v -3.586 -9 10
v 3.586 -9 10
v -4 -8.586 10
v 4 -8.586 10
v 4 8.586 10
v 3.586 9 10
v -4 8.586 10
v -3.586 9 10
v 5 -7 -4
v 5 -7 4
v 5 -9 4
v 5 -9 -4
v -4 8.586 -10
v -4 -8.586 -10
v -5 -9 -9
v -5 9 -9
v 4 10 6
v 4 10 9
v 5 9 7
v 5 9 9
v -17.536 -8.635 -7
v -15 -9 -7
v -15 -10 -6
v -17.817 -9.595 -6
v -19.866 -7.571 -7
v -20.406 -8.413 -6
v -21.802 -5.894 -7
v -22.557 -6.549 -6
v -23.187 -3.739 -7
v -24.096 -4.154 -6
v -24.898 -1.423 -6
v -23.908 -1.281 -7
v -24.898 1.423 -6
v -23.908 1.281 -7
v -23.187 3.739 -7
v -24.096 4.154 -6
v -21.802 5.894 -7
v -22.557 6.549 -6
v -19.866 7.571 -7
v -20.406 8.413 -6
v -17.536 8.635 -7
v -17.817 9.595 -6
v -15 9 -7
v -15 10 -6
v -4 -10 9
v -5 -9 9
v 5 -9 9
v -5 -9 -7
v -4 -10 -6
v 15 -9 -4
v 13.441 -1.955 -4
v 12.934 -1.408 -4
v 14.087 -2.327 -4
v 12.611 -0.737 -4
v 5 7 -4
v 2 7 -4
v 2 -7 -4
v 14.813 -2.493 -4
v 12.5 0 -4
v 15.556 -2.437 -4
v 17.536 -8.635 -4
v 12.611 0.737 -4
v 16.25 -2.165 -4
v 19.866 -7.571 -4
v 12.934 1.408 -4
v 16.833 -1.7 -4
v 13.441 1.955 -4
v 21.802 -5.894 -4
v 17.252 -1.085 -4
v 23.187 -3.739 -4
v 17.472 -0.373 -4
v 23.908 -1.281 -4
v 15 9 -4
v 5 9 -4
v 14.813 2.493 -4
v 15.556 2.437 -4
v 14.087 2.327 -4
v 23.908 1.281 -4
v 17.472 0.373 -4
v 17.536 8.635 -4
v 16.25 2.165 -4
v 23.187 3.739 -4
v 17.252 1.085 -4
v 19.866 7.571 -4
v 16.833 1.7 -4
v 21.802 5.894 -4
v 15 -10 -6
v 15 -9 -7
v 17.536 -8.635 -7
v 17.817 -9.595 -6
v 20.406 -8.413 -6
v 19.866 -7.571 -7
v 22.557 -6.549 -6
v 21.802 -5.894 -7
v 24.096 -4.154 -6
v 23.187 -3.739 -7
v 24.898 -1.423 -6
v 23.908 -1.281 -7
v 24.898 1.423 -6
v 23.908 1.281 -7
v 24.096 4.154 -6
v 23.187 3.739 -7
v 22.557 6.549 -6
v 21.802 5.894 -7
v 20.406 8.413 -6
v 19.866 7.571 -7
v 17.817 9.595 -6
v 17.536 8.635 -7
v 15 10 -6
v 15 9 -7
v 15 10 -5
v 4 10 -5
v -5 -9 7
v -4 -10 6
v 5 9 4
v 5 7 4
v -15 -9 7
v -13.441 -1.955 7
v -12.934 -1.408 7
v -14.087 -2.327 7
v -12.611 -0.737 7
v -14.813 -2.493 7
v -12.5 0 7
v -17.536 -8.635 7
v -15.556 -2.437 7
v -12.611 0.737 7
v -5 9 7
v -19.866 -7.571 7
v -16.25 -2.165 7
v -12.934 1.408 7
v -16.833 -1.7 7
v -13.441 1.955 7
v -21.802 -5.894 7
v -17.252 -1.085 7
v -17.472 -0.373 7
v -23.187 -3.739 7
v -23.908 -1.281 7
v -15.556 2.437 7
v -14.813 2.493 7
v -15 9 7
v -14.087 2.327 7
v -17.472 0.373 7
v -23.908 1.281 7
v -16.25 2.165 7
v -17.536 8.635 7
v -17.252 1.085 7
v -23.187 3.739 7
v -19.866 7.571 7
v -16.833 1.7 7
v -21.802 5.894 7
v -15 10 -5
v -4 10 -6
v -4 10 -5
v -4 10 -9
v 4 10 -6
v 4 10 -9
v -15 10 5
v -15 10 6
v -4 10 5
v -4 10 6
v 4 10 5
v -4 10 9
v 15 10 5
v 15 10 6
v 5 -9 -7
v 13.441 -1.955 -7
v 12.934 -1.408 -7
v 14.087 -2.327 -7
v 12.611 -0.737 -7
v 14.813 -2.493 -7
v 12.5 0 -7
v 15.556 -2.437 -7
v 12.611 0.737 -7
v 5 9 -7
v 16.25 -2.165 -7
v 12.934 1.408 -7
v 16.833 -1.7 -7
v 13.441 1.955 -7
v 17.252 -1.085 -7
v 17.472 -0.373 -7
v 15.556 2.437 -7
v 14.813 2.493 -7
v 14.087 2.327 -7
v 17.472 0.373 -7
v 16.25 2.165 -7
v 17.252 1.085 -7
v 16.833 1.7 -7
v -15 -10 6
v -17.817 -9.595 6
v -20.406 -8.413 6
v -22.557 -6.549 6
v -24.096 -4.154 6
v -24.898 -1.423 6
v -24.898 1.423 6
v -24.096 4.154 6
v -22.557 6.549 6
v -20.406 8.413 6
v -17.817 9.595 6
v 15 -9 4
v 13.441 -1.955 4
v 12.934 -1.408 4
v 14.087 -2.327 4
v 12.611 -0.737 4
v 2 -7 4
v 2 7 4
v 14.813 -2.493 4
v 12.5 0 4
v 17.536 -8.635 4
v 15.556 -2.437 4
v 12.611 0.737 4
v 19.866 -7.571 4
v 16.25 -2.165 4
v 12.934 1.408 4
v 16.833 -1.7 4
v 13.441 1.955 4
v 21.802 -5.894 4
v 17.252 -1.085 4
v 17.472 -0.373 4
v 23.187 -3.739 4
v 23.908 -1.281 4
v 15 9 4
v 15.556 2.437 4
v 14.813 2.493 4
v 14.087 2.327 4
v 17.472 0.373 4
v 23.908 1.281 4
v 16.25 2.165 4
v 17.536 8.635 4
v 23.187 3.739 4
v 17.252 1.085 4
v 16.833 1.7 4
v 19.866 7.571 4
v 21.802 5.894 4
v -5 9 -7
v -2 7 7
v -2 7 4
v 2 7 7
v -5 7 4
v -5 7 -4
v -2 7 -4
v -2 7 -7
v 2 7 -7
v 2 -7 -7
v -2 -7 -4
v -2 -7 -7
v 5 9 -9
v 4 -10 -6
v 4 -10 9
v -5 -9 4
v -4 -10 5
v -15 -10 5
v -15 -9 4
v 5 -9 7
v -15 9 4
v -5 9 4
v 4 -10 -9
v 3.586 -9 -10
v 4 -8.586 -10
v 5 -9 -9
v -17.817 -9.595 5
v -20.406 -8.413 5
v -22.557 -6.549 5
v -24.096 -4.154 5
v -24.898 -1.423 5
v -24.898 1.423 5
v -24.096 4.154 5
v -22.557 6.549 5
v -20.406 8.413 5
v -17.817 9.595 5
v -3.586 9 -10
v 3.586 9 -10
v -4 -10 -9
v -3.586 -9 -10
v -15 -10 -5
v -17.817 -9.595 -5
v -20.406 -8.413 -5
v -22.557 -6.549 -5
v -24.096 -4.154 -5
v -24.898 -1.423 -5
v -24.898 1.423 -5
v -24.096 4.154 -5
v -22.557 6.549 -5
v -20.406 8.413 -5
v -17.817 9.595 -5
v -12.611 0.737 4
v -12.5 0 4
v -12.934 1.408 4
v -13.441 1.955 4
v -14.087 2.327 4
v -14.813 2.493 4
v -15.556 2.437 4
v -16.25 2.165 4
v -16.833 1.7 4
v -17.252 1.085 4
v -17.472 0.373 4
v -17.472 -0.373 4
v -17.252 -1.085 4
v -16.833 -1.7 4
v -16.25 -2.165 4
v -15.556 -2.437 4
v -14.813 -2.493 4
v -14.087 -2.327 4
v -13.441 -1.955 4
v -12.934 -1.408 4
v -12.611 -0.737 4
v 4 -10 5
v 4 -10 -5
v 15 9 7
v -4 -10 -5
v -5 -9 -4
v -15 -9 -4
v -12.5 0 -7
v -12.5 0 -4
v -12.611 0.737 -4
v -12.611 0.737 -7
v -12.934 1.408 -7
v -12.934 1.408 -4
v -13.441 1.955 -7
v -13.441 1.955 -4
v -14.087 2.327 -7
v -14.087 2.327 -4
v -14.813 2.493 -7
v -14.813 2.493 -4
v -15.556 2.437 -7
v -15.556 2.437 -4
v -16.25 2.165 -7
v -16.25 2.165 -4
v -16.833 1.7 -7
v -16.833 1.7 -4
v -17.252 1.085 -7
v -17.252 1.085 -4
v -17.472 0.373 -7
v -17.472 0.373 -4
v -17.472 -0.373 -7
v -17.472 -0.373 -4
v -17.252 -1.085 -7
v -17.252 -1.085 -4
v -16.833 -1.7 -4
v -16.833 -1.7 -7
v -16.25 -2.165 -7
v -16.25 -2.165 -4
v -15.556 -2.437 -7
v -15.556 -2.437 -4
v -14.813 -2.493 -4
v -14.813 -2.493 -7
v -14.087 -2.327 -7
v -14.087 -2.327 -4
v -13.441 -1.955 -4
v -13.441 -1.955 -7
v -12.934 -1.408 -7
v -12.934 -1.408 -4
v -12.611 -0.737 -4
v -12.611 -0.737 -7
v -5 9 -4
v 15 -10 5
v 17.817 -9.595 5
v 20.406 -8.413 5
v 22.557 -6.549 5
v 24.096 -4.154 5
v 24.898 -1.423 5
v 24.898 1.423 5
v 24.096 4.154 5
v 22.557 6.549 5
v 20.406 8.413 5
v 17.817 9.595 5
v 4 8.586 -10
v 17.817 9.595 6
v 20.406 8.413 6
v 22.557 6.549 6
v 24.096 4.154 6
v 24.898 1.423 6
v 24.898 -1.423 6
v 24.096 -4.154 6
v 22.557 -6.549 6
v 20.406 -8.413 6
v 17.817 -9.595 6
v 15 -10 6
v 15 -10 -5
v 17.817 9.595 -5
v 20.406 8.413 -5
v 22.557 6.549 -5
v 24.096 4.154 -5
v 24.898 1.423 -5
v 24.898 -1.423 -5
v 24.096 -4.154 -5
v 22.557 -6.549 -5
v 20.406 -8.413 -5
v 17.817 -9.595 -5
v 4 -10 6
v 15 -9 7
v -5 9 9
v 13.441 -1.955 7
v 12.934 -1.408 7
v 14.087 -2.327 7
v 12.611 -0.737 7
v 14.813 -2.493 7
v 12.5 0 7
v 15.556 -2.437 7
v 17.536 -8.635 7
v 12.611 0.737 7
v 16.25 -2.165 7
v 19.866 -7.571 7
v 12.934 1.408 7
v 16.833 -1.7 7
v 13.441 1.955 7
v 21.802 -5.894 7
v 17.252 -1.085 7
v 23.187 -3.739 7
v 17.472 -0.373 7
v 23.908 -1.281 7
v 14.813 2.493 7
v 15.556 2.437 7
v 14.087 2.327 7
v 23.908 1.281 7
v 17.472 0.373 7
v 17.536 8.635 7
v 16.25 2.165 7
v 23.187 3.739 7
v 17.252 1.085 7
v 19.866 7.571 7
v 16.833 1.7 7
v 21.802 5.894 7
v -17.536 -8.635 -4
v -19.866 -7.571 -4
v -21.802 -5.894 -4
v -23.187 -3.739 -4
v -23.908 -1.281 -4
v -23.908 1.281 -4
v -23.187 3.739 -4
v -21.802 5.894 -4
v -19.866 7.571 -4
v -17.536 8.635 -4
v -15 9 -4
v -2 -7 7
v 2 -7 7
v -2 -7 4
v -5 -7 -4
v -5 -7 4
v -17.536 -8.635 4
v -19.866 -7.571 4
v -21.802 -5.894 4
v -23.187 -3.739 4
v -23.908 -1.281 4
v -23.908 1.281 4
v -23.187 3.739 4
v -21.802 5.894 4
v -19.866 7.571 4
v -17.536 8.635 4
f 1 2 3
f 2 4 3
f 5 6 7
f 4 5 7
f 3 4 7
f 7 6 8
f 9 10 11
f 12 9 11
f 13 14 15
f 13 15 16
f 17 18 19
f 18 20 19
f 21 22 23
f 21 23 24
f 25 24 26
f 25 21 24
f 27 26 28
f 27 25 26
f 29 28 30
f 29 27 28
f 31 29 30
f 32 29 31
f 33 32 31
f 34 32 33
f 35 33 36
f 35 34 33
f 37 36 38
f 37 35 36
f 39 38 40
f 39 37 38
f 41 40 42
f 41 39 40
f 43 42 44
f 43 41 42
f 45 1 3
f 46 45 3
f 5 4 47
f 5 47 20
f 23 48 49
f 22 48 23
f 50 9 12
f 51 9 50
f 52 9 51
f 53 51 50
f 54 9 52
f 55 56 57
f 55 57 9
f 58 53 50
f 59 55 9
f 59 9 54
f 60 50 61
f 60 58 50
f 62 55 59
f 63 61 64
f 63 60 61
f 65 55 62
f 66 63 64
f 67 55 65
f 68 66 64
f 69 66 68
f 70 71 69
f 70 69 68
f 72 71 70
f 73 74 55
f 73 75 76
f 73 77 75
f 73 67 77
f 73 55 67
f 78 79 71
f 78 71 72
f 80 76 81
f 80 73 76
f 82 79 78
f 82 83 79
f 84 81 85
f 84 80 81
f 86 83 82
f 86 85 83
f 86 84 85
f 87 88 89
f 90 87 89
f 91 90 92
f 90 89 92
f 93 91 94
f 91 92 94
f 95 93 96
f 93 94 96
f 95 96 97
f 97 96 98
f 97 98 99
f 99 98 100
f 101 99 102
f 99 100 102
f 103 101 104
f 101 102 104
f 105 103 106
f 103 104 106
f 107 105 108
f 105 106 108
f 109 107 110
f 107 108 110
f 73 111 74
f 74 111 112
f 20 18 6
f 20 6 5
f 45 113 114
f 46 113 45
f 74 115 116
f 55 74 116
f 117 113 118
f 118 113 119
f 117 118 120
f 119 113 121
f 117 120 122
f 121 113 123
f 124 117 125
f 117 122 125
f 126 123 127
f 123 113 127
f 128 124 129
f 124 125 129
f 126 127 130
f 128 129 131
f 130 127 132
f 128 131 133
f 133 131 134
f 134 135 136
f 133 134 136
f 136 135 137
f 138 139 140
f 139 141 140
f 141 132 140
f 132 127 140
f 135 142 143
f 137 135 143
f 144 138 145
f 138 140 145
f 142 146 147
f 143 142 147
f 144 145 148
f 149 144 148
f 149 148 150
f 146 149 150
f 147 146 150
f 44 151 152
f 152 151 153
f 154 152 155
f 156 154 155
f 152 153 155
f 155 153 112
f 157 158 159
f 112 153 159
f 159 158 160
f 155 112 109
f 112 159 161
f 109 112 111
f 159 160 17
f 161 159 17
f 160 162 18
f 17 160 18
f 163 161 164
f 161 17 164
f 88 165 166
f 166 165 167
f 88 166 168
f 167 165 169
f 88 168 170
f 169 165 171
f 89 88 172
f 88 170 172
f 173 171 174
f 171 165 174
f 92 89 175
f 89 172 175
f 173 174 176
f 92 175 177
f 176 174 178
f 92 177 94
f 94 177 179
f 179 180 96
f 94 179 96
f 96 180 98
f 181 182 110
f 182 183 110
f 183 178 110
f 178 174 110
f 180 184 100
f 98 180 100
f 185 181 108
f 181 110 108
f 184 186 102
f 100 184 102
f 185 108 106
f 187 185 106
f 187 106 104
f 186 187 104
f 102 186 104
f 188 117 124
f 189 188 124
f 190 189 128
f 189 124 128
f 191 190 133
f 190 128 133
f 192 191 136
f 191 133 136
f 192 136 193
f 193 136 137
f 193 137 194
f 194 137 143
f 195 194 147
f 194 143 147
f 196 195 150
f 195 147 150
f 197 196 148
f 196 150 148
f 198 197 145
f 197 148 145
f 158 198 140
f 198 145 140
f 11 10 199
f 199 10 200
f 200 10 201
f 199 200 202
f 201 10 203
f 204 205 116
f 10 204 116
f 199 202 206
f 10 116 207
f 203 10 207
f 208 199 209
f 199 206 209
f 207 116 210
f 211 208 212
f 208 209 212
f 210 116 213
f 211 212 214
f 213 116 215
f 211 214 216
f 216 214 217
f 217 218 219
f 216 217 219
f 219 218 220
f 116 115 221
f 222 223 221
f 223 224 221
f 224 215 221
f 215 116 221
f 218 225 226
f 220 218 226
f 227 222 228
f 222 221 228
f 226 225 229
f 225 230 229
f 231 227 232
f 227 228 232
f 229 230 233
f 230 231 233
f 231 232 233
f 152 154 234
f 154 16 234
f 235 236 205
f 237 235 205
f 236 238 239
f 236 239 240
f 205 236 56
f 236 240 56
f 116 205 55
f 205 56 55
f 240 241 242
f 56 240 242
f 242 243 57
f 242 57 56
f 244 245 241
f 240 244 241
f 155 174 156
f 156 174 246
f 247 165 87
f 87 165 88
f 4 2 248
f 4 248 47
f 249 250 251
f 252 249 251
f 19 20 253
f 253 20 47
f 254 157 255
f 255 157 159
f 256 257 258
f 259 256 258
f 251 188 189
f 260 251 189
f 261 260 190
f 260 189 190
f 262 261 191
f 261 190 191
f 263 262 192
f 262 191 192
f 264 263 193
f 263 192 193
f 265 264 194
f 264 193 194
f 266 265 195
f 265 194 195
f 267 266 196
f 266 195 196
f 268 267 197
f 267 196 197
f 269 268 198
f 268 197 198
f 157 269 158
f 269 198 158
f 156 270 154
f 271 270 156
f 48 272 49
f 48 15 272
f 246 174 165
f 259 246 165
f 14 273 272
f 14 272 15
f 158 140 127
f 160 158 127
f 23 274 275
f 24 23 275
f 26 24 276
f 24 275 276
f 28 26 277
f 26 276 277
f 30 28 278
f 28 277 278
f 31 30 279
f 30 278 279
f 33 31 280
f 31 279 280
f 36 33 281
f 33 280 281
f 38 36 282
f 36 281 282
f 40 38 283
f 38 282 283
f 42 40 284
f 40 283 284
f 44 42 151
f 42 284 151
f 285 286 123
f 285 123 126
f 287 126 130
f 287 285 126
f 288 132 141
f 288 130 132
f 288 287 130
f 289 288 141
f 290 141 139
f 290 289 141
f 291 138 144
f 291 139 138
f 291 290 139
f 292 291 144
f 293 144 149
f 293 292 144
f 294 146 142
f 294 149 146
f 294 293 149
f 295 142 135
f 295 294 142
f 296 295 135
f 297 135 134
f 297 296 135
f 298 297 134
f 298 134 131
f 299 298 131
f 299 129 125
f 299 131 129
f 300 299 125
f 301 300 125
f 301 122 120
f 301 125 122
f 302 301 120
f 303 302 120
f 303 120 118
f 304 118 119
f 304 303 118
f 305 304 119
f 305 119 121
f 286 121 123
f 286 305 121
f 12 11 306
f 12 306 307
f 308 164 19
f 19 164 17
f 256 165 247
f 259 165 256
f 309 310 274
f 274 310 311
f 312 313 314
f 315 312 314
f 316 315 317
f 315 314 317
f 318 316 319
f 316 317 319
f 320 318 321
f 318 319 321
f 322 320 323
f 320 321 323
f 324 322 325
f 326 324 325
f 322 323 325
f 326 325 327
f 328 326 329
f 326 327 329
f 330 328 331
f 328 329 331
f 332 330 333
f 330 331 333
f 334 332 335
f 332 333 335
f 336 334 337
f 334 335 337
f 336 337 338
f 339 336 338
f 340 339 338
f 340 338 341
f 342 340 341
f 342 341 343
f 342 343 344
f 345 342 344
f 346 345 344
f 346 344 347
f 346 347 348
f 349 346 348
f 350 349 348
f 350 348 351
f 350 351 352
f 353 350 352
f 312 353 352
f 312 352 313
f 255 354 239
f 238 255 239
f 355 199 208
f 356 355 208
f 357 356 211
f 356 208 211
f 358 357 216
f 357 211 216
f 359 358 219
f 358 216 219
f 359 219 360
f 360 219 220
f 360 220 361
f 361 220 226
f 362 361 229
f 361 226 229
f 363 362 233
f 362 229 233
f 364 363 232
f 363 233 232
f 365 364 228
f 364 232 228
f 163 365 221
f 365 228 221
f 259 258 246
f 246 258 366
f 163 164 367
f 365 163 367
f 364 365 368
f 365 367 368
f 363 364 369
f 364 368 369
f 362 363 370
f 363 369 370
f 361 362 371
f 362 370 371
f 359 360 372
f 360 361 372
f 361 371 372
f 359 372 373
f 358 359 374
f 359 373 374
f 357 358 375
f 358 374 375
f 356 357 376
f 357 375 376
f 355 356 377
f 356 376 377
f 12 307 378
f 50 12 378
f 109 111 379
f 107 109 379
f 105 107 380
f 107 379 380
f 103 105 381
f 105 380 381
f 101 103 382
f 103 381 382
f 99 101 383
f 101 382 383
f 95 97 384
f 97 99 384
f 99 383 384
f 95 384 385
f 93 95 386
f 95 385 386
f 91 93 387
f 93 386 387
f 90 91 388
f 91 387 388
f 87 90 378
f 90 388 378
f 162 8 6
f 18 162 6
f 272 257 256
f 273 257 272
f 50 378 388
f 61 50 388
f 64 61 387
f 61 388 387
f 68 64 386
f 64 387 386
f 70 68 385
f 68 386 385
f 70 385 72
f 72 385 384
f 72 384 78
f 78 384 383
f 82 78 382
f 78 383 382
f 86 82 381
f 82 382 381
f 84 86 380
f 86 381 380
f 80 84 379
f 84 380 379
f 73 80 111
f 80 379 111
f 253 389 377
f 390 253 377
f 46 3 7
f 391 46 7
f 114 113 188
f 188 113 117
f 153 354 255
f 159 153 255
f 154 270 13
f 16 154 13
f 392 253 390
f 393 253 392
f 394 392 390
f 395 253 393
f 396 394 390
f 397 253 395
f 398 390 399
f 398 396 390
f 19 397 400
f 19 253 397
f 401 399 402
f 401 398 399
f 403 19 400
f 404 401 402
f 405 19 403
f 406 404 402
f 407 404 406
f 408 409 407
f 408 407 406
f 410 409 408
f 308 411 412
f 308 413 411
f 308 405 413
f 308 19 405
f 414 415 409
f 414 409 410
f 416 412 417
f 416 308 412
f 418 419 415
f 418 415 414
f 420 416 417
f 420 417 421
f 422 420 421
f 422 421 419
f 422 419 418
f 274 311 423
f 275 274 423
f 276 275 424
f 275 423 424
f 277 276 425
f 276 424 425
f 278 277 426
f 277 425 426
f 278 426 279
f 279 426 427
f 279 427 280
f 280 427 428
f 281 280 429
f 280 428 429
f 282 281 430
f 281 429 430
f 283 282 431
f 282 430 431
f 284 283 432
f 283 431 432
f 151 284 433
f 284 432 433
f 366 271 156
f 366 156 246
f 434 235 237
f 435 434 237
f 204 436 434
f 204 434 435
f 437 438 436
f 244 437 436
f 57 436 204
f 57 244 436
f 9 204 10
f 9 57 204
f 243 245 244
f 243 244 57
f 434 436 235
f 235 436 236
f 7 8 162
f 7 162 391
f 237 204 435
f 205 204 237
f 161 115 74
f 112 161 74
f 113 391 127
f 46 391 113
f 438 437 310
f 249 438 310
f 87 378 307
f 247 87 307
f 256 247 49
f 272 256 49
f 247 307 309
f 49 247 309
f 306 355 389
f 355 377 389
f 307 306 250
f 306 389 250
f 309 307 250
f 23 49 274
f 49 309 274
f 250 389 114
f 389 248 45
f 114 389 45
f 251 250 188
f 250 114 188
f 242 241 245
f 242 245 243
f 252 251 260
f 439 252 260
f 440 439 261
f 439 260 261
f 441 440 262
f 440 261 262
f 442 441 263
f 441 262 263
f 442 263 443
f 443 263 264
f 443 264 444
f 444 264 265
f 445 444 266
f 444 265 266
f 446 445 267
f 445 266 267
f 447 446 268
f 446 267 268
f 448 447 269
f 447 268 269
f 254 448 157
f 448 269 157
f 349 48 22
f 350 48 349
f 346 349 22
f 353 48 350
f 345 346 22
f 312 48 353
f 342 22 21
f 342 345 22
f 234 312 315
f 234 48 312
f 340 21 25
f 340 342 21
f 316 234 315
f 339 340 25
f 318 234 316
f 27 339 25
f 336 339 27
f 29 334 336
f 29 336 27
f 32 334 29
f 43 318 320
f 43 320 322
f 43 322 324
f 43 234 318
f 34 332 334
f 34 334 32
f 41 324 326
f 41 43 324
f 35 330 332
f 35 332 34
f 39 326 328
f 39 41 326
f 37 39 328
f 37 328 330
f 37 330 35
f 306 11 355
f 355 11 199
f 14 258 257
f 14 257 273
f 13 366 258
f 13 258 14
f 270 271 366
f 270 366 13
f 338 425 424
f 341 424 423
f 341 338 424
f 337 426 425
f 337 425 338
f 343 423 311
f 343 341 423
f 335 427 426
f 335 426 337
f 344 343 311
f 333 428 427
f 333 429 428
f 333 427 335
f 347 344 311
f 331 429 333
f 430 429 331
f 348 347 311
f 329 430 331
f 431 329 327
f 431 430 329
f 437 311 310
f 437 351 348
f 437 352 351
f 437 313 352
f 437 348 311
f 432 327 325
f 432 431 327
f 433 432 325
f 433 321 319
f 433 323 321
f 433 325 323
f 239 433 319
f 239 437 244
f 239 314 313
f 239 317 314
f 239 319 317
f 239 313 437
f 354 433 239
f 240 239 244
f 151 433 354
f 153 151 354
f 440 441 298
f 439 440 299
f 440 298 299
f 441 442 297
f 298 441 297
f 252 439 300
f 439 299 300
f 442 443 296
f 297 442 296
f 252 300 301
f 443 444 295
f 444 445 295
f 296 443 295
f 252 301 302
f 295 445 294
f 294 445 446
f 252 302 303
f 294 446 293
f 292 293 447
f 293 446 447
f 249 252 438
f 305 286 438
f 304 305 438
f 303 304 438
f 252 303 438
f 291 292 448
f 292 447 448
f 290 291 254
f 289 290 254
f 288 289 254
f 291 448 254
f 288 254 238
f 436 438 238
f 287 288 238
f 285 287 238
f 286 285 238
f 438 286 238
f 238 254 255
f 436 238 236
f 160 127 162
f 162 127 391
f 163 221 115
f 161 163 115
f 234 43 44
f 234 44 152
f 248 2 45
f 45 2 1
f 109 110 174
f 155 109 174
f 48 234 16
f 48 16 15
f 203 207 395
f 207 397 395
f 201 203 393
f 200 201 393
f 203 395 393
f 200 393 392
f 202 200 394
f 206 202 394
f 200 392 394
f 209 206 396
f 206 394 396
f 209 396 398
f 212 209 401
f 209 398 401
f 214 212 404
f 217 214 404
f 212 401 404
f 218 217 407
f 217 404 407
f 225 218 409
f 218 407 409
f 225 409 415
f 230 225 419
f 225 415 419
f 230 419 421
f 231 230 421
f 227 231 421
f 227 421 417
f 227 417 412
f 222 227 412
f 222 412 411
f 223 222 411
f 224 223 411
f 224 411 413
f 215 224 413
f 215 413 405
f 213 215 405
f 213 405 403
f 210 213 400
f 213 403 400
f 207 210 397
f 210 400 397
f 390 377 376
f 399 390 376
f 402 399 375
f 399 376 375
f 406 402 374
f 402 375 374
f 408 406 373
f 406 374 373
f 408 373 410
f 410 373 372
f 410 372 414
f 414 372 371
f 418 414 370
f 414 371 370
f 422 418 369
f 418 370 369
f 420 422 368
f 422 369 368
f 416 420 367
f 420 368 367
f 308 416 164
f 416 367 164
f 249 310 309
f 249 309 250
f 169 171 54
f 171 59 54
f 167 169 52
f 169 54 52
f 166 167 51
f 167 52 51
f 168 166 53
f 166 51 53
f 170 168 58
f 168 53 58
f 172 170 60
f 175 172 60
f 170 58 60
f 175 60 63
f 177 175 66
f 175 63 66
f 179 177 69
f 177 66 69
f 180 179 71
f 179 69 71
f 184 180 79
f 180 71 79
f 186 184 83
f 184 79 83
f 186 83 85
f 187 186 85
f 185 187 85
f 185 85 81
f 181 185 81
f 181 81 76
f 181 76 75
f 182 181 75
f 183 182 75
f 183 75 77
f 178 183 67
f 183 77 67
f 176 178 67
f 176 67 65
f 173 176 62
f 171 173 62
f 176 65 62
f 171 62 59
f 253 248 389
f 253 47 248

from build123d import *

# Parameters (mm, degrees)
BOSS_EXTRUDE1_DEPTH = 10
CUT_EXTRUDE1_DEPTH  = 4
CUT_EXTRUDE2_START  = -7
CUT_EXTRUDE2_DEPTH  = 7
CUT_EXTRUDE3_START  = 14
CUT_EXTRUDE3_DEPTH  = 7
SKETCH3_R           = 2.5
CUT_EXTRUDE4_DEPTH  = 10
CHAMFER2_SIZE       = 1
CHAMFER3_SIZE       = 1
CHAMFER4_SIZE       = 1
SHELL1_START        = -4
SHELL1_OUTLINE_W    = 10
SHELL1_OUTLINE_H    = 14
SHELL1_DEPTH        = 8
SHELL1_START_2      = -7
SHELL1_2_OUTLINE_W  = 4
SHELL1_2_OUTLINE_H  = 14
SHELL1_2_DEPTH      = 14
CHAMFER5_SIZE       = 1


# Read off the part's stored shape, not the designer's step: Shell1
with BuildPart() as part:
    # Sketch1 → Boss-Extrude1 (new, symmetric)
    with BuildSketch(Plane.XY):
        with BuildLine():
            Line((-15, 10), (15, 10))
            ThreePointArc((15, 10), (25, 0), (15, -10))
            Line((15, -10), (-15, -10))
            ThreePointArc((-15, -10), (-25, 0), (-15, 10))
        make_face()
    extrude(amount=BOSS_EXTRUDE1_DEPTH, both=True)

    # Sketch2 → Cut-Extrude1 (cut, symmetric)
    with BuildSketch(Plane.XY):
        with BuildLine():
            Line((-15, 10), (-5, 10))
            Line((-5, 10), (-5, -10))
            Line((-5, -10), (-15, -10))
            ThreePointArc((-15, -10), (-25, 0), (-15, 10))
        make_face()
        with BuildLine():
            Line((5, -10), (15, -10))
            ThreePointArc((15, -10), (25, 0), (15, 10))
            Line((15, 10), (5, 10))
            Line((5, 10), (5, -10))
        make_face()
    extrude(amount=CUT_EXTRUDE1_DEPTH, both=True, mode=Mode.SUBTRACT)

    # Sketch2<2> → Cut-Extrude2 (cut)
    with BuildSketch(Plane.XY.offset(CUT_EXTRUDE2_START)):
        with BuildLine():
            Line((-15, 10), (-5, 10))
            Line((-5, 10), (-5, -10))
            Line((-5, -10), (-15, -10))
            ThreePointArc((-15, -10), (-25, 0), (-15, 10))
        make_face()
        with BuildLine():
            Line((5, -10), (15, -10))
            ThreePointArc((15, -10), (25, 0), (15, 10))
            Line((15, 10), (5, 10))
            Line((5, 10), (5, -10))
        make_face()
    extrude(amount=-CUT_EXTRUDE2_DEPTH, mode=Mode.SUBTRACT)

    # Sketch2<3> → Cut-Extrude3 (cut)
    with BuildSketch(Plane.XY.offset(CUT_EXTRUDE3_START)):
        with BuildLine():
            Line((-15, 10), (-5, 10))
            Line((-5, 10), (-5, -10))
            Line((-5, -10), (-15, -10))
            ThreePointArc((-15, -10), (-25, 0), (-15, 10))
        make_face()
        with BuildLine():
            Line((5, -10), (15, -10))
            ThreePointArc((15, -10), (25, 0), (15, 10))
            Line((15, 10), (5, 10))
            Line((5, 10), (5, -10))
        make_face()
    extrude(amount=-CUT_EXTRUDE3_DEPTH, mode=Mode.SUBTRACT)

    # Sketch3 → Cut-Extrude4 (cut, symmetric)
    with BuildSketch(Plane.XY):
        with Locations((-15, 0)):
            Circle(SKETCH3_R)
        with Locations(Location((15, 0, 0), (0, 0, 180))):
            Circle(SKETCH3_R)
    extrude(amount=CUT_EXTRUDE4_DEPTH, both=True, mode=Mode.SUBTRACT)

    # Chamfer2
    chamfer2_edges = [part.edges().sort_by_distance(p)[0] for p in [
        (10, -10, 7),
        (-25, 0, -4),
        (-10, 10, -4),
        (-10, -10, -4),
        (-25, 0, 4),
        (-10, -10, 4),
        (-10, 10, 4),
        (25, 0, -4),
        (10, -10, -4),
        (10, 10, -4),
        (25, 0, 4),
        (10, 10, 4),
        (10, -10, 4),
        (-25, 0, -7),
        (-10, -10, -7),
        (-10, 10, -7),
        (25, 0, -7),
        (10, 10, -7),
        (10, -10, -7),
        (-25, 0, 7),
        (-10, -10, 7),
        (-10, 10, 7),
        (25, 0, 7),
        (10, 10, 7),
    ]]
    chamfer(chamfer2_edges, length=CHAMFER2_SIZE)

    # Chamfer3
    chamfer3_edges = [part.edges().sort_by_distance(p)[0] for p in [
        (-5, -10, -8),
        (5, -10, -8),
        (5, -10, 8),
        (-5, -10, 8),
        (-5, 10, 8),
        (5, 10, 8),
        (5, 10, -8),
        (-5, 10, -8),
    ]]
    chamfer(chamfer3_edges, length=CHAMFER3_SIZE)

    # Chamfer4
    chamfer4_edges = [part.edges().sort_by_distance(p)[0] for p in [
        (-5, 0, -10),
        (0, -10, 10),
        (0, -10, -10),
        (0, 10, -10),
        (5, 0, -10),
        (-4.5, 9.5, -10),
        (4.5, 9.5, -10),
        (4.5, -9.5, -10),
        (-4.5, -9.5, -10),
        (5, 0, 10),
        (0, 10, 10),
        (-5, 0, 10),
        (4.5, 9.5, 10),
        (-4.5, 9.5, 10),
        (-4.5, -9.5, 10),
        (4.5, -9.5, 10),
    ]]
    chamfer(chamfer4_edges, length=CHAMFER4_SIZE)

    # Shell1 outline → Shell1 (cut)
    with BuildSketch(Plane.XY.offset(SHELL1_START)):
        Rectangle(SHELL1_OUTLINE_W, SHELL1_OUTLINE_H)
    extrude(amount=SHELL1_DEPTH, mode=Mode.SUBTRACT)

    # Shell1 2 outline → Shell1 2 (cut)
    with BuildSketch(Plane.XY.offset(SHELL1_START_2)):
        Rectangle(SHELL1_2_OUTLINE_W, SHELL1_2_OUTLINE_H)
    extrude(amount=SHELL1_2_DEPTH, mode=Mode.SUBTRACT)

    # Chamfer5
    chamfer5_edges = [part.edges().sort_by_distance(p)[0] for p in [
        (5, -10, 0),
        (-5, -10, 0),
        (5, 10, 0),
        (-5, 10, 0),
    ]]
    chamfer(chamfer5_edges, length=CHAMFER5_SIZE)


solid = part.part
